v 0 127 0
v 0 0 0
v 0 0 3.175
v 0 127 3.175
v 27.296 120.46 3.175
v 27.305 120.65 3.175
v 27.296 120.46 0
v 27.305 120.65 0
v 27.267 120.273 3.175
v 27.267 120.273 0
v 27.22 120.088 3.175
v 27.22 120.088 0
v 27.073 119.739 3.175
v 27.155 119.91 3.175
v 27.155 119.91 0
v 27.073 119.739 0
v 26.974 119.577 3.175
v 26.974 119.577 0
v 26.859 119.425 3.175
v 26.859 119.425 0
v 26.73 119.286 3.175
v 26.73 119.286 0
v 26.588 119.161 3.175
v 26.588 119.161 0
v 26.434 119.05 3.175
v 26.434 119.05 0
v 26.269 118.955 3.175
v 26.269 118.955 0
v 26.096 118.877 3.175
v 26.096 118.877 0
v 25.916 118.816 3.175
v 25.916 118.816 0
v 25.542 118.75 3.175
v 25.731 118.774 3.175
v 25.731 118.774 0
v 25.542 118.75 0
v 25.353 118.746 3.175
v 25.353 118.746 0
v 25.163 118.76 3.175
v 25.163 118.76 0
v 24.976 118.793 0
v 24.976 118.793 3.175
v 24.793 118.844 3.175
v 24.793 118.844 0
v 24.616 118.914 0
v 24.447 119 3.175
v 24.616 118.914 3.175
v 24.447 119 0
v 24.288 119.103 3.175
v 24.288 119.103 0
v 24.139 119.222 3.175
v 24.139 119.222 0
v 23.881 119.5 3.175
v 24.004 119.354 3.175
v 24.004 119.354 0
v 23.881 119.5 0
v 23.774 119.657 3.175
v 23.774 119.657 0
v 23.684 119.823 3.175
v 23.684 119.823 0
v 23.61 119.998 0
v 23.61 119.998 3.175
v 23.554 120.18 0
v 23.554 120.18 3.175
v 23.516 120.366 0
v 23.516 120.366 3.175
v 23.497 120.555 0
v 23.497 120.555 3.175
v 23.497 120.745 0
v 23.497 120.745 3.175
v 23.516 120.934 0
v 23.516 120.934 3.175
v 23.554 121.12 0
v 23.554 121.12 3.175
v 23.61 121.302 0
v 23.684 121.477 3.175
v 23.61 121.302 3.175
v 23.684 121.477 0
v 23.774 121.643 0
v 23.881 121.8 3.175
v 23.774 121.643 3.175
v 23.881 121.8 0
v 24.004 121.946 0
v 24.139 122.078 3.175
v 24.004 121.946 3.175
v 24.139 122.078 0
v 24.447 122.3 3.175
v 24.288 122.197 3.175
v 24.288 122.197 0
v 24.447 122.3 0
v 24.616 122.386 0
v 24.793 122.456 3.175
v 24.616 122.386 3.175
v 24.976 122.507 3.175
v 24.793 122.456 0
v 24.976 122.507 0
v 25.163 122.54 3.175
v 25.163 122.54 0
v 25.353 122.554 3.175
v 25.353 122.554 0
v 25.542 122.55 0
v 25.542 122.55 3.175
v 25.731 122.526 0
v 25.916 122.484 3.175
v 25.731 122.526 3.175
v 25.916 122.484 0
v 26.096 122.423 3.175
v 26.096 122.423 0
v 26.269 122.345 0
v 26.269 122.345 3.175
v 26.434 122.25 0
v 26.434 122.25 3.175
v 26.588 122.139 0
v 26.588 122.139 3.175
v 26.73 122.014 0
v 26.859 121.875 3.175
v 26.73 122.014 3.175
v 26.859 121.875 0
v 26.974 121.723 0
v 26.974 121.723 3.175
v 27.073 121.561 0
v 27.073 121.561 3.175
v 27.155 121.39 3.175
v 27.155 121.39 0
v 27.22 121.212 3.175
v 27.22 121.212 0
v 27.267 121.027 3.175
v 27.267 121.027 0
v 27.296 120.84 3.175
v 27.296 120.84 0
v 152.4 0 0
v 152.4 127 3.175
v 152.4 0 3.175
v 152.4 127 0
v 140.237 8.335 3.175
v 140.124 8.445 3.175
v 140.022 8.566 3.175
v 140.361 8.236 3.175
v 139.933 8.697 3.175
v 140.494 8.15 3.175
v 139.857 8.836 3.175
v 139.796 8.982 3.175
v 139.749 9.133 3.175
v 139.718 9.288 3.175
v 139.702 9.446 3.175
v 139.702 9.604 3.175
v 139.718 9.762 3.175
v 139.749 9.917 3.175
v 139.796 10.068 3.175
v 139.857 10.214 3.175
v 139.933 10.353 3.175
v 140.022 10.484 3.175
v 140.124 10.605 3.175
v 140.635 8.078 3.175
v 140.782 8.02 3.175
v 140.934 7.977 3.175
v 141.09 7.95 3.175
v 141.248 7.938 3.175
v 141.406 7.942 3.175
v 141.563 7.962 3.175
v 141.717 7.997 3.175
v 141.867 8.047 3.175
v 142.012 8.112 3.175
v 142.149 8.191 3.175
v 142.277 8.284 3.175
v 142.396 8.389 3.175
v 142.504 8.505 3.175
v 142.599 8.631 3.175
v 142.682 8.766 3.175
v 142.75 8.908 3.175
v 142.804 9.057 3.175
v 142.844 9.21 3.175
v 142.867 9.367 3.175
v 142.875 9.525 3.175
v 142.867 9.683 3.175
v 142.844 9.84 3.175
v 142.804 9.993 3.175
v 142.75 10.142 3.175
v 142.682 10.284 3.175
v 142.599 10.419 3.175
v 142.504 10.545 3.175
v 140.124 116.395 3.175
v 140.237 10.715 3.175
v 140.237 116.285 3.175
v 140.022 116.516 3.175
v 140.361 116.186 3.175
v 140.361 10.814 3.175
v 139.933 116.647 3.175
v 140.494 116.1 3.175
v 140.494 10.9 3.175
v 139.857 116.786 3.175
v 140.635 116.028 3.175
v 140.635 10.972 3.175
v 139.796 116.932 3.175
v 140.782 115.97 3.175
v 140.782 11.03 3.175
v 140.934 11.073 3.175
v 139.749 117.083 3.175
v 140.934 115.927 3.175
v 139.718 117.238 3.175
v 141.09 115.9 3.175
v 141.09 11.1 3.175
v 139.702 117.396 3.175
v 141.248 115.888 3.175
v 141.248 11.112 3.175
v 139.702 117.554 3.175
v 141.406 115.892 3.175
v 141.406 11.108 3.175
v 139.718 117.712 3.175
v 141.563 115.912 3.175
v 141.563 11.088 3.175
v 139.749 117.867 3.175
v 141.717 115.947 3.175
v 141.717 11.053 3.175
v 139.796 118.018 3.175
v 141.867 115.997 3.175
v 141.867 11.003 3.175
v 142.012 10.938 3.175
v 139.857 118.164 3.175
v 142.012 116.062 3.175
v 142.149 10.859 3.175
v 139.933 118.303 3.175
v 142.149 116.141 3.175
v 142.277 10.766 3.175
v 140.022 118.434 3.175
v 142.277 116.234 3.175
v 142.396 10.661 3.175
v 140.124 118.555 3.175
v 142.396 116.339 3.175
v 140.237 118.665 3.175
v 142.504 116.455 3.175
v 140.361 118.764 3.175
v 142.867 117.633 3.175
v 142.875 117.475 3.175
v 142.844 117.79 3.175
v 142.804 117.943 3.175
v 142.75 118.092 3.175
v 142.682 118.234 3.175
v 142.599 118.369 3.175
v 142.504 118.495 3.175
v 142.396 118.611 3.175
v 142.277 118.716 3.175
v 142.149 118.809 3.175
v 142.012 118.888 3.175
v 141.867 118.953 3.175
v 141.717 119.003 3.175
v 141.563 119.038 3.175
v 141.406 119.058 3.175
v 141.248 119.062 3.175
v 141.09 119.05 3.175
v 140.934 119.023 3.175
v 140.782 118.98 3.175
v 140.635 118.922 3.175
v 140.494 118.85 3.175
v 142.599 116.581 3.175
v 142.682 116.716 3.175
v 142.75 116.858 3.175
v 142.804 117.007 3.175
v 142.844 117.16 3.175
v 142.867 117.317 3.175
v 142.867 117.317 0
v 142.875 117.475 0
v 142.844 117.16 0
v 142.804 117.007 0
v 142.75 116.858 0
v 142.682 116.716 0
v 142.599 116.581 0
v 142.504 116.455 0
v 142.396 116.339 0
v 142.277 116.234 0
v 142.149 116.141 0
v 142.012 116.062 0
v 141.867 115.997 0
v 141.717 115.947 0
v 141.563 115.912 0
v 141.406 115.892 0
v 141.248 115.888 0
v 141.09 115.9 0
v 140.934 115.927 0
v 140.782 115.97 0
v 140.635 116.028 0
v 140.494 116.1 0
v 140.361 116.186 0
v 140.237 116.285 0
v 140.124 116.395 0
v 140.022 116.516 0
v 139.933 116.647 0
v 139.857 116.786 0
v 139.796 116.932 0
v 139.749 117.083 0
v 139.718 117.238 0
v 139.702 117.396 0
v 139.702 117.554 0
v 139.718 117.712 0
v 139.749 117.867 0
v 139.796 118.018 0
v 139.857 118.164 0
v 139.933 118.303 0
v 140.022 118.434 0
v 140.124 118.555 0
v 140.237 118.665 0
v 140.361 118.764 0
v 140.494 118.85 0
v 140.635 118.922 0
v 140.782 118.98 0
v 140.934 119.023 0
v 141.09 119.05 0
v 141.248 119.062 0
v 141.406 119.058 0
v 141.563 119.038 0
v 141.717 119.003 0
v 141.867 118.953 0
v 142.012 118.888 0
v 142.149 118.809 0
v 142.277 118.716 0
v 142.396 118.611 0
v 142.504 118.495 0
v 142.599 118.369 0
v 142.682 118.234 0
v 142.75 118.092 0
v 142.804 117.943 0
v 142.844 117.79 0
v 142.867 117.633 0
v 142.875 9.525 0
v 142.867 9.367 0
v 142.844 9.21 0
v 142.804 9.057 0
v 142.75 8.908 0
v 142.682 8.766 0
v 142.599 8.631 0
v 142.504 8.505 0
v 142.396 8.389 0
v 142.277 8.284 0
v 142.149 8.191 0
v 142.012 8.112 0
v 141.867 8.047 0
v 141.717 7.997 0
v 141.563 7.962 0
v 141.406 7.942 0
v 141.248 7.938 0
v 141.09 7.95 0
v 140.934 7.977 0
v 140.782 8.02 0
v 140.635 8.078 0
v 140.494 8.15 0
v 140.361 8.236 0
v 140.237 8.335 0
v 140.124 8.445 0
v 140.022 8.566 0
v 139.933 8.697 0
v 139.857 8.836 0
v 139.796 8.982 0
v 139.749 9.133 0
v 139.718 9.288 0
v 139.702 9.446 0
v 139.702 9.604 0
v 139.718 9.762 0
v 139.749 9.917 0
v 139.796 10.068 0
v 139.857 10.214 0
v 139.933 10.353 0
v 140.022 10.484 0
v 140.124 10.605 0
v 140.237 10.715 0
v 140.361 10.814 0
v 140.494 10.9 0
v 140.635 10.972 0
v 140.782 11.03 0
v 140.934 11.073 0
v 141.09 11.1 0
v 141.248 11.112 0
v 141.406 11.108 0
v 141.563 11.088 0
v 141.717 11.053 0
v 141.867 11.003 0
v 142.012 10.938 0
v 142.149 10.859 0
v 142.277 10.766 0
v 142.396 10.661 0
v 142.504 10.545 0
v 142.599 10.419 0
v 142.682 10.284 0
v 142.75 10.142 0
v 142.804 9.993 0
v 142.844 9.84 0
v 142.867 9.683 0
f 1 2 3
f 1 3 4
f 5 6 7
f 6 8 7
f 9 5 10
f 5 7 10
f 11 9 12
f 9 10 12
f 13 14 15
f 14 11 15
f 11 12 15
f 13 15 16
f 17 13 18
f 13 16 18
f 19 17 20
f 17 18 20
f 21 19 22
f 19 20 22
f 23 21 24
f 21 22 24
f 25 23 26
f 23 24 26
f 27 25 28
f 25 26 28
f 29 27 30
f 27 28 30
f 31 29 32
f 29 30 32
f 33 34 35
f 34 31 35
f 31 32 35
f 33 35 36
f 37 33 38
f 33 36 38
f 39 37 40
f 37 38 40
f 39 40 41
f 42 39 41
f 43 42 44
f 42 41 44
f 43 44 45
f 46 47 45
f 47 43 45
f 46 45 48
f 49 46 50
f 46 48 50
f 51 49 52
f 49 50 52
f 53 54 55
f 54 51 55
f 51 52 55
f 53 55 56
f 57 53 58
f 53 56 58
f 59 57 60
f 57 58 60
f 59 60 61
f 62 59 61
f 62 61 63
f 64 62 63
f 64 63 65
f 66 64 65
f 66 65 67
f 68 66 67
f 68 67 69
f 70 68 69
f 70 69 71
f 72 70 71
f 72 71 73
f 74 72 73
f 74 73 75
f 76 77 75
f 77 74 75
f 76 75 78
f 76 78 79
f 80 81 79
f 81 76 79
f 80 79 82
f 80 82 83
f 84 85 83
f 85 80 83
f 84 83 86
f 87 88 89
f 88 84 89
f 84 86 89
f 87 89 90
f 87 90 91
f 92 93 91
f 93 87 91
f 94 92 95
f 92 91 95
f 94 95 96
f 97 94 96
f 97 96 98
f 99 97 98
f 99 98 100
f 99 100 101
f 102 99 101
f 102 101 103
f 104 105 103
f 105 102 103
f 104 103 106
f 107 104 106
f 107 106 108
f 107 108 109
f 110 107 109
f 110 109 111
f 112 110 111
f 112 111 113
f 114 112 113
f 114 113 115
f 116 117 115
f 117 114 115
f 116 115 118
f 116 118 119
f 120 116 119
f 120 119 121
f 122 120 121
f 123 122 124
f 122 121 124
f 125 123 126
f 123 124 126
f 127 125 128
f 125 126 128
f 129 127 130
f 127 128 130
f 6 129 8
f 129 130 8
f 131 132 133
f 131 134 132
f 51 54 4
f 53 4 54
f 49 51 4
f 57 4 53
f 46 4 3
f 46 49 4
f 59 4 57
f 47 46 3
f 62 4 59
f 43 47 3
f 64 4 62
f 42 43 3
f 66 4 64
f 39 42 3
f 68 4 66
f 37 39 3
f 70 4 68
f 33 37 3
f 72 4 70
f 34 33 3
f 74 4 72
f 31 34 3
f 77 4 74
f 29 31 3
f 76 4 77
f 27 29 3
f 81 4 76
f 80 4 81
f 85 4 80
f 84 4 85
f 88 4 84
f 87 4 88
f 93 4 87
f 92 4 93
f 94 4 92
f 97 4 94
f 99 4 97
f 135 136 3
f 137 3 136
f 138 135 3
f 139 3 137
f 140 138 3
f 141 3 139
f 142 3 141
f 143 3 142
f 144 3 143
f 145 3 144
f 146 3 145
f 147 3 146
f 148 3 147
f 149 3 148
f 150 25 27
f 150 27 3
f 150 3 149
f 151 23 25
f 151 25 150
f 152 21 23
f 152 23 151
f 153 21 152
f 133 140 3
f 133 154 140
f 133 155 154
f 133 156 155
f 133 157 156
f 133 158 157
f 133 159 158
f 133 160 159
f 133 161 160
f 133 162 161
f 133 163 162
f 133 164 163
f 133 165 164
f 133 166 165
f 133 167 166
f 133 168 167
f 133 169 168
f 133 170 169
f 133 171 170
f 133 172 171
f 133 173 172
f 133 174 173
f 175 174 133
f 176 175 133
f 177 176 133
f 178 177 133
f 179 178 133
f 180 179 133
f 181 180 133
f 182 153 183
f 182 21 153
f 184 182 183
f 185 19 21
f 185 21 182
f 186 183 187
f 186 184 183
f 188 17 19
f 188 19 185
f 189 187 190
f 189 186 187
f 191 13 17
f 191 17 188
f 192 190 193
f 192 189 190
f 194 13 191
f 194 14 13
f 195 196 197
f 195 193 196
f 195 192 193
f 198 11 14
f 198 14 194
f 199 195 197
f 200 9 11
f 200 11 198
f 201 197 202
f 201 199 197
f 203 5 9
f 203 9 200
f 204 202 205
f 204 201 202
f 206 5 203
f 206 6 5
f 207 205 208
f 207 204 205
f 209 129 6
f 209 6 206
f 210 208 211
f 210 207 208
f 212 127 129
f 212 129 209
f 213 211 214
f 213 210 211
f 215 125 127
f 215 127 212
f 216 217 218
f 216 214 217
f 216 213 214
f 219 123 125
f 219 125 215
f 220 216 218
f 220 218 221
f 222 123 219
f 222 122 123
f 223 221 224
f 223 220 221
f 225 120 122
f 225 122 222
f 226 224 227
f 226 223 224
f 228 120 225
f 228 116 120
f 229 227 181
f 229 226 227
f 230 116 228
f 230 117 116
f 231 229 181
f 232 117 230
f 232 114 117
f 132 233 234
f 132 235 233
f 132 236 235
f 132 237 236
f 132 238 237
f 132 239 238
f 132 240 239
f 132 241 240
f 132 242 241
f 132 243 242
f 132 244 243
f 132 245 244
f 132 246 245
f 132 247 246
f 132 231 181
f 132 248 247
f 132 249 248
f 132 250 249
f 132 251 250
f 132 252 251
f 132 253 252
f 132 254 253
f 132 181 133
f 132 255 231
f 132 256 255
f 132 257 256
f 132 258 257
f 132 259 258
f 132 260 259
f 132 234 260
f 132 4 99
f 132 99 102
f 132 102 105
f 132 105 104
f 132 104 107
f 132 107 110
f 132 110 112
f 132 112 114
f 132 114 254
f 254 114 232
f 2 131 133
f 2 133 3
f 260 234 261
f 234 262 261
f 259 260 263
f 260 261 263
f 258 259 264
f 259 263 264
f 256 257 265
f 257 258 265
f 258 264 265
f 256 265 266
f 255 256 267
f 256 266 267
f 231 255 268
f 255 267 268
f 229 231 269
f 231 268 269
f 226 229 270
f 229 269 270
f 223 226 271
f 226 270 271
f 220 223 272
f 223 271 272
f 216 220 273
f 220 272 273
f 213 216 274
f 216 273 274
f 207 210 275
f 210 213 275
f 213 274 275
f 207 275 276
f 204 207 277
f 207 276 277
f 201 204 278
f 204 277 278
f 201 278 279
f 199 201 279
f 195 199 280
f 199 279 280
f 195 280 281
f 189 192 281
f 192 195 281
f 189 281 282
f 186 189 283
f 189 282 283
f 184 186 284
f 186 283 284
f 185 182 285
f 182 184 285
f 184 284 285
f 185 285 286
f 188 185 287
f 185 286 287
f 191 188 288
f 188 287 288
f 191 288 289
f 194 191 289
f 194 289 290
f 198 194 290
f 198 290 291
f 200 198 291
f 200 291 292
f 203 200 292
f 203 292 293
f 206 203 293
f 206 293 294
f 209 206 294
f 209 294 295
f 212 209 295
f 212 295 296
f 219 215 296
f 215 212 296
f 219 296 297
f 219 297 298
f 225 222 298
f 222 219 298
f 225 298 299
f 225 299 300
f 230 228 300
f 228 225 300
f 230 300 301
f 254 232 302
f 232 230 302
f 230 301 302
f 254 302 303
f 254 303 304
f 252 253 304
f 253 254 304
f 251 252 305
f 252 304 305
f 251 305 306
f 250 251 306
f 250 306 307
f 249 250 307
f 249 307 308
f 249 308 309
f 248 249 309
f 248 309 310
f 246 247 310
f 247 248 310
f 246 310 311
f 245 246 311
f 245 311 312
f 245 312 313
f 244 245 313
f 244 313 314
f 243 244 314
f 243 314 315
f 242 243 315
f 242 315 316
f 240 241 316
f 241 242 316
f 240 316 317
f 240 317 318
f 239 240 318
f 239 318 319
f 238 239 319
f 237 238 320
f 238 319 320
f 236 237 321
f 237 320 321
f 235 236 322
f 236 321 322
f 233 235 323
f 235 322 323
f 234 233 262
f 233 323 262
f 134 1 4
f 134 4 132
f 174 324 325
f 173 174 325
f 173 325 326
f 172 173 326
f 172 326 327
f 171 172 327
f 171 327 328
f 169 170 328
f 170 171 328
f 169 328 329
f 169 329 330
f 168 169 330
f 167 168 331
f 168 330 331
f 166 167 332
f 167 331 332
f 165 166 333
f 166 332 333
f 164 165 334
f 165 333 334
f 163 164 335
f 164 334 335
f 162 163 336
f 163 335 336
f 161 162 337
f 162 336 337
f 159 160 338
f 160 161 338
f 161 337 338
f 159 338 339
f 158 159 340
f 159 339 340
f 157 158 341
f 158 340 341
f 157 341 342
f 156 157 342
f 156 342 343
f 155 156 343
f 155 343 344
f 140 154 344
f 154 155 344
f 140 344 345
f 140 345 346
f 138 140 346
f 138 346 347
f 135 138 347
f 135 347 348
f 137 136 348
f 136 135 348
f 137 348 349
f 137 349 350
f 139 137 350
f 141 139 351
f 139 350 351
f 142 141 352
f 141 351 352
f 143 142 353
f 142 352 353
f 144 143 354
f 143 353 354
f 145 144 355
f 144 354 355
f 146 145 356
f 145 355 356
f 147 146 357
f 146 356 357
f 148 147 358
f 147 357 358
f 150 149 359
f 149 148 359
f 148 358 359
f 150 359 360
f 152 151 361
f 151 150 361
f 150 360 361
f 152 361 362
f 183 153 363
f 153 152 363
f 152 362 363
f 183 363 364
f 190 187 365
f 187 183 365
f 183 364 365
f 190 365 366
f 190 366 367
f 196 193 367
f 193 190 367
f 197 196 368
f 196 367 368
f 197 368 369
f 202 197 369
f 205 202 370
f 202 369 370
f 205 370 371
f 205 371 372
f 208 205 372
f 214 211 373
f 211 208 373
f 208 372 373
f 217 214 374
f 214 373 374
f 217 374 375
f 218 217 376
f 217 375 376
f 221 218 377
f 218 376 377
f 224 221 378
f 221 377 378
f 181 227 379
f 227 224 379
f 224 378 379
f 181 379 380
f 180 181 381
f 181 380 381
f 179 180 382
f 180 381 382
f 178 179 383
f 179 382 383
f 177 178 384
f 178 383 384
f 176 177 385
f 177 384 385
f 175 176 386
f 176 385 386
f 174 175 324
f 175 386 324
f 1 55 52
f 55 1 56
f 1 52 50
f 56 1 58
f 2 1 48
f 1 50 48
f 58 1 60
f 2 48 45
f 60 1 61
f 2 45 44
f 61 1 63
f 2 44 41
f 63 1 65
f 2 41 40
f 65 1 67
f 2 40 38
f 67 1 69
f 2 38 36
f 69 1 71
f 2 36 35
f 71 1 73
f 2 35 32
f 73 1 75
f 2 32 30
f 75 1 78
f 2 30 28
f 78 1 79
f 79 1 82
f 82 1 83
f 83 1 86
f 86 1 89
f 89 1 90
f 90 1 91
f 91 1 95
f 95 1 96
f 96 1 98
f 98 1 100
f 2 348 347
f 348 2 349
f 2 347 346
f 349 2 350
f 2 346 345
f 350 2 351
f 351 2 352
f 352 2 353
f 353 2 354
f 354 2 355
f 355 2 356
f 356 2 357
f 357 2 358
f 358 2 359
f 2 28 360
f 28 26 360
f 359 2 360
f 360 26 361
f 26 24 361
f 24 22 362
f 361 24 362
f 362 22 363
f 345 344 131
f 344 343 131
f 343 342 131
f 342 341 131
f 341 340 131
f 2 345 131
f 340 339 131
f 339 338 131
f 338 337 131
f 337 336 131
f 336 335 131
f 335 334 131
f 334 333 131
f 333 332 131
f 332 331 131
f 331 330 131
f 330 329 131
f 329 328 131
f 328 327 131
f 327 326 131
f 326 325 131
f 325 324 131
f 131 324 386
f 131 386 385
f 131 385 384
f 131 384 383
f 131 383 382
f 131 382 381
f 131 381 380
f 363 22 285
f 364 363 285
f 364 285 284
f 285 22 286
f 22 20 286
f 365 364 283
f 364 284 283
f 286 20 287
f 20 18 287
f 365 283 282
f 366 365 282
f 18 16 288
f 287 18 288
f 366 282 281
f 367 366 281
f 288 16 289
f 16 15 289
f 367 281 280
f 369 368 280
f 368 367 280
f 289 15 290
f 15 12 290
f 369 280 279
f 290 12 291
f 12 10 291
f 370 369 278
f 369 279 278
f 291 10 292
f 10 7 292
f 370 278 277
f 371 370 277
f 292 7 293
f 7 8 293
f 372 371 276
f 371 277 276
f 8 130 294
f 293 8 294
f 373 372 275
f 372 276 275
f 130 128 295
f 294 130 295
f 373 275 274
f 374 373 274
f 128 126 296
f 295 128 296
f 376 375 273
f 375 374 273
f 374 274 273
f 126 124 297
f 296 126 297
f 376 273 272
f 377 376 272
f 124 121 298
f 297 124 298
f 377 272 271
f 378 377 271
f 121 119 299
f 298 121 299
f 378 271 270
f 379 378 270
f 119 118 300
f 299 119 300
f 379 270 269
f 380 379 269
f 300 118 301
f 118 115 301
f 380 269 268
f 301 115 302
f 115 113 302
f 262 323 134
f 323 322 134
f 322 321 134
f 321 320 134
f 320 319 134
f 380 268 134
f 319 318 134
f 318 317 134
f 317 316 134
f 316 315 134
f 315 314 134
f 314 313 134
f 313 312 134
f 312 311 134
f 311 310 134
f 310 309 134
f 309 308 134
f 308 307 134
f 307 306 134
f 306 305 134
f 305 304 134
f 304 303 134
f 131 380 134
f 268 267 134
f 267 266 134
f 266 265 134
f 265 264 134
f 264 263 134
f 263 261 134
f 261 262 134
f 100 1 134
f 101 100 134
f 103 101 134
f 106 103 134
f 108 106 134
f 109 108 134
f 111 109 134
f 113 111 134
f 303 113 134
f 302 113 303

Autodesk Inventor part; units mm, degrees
ref_plane "YZ Plane" through (0, 0, 0) normal (1, 0, 0) x (0, 1, 0)
ref_plane "XZ Plane" through (0, 0, 0) normal (0, 1, 0) x (-1, 0, 0)
ref_plane "XY Plane" through (0, 0, 0) normal (0, 0, 1) x (1, 0, 0)
sketch "Sketch1" plane through (0, 0, 0) normal (0, 0, 1) x (1, 0, 0)
  line L0 (0, 0) -> (0, 127)
  line L1 (0, 127) -> (152.4, 127)
  line L2 (152.4, 127) -> (152.4, 0)
  line L3 (152.4, 0) -> (0, 0)
  circle A0 centre (25.4, 120.65) radius 1.905
  line L4 (0, 120.65) -> (152.4, 120.65) construction
  circle A1 centre (141.2875, 117.475) radius 1.5875 projected
  circle A2 centre (141.2875, 9.525) radius 1.5875 projected
  dimension "d0" = 127
  dimension "d1" = 152.4
  dimension "d4" = 3.81
  dimension "d5" = 6.35
  dimension "d6" = 25.4
extrude "Extrusion1" add sketch "Sketch1" along normal blind 3.175
properties part number "Wheel Shield 2" material "Polycarbonate, Clear"
